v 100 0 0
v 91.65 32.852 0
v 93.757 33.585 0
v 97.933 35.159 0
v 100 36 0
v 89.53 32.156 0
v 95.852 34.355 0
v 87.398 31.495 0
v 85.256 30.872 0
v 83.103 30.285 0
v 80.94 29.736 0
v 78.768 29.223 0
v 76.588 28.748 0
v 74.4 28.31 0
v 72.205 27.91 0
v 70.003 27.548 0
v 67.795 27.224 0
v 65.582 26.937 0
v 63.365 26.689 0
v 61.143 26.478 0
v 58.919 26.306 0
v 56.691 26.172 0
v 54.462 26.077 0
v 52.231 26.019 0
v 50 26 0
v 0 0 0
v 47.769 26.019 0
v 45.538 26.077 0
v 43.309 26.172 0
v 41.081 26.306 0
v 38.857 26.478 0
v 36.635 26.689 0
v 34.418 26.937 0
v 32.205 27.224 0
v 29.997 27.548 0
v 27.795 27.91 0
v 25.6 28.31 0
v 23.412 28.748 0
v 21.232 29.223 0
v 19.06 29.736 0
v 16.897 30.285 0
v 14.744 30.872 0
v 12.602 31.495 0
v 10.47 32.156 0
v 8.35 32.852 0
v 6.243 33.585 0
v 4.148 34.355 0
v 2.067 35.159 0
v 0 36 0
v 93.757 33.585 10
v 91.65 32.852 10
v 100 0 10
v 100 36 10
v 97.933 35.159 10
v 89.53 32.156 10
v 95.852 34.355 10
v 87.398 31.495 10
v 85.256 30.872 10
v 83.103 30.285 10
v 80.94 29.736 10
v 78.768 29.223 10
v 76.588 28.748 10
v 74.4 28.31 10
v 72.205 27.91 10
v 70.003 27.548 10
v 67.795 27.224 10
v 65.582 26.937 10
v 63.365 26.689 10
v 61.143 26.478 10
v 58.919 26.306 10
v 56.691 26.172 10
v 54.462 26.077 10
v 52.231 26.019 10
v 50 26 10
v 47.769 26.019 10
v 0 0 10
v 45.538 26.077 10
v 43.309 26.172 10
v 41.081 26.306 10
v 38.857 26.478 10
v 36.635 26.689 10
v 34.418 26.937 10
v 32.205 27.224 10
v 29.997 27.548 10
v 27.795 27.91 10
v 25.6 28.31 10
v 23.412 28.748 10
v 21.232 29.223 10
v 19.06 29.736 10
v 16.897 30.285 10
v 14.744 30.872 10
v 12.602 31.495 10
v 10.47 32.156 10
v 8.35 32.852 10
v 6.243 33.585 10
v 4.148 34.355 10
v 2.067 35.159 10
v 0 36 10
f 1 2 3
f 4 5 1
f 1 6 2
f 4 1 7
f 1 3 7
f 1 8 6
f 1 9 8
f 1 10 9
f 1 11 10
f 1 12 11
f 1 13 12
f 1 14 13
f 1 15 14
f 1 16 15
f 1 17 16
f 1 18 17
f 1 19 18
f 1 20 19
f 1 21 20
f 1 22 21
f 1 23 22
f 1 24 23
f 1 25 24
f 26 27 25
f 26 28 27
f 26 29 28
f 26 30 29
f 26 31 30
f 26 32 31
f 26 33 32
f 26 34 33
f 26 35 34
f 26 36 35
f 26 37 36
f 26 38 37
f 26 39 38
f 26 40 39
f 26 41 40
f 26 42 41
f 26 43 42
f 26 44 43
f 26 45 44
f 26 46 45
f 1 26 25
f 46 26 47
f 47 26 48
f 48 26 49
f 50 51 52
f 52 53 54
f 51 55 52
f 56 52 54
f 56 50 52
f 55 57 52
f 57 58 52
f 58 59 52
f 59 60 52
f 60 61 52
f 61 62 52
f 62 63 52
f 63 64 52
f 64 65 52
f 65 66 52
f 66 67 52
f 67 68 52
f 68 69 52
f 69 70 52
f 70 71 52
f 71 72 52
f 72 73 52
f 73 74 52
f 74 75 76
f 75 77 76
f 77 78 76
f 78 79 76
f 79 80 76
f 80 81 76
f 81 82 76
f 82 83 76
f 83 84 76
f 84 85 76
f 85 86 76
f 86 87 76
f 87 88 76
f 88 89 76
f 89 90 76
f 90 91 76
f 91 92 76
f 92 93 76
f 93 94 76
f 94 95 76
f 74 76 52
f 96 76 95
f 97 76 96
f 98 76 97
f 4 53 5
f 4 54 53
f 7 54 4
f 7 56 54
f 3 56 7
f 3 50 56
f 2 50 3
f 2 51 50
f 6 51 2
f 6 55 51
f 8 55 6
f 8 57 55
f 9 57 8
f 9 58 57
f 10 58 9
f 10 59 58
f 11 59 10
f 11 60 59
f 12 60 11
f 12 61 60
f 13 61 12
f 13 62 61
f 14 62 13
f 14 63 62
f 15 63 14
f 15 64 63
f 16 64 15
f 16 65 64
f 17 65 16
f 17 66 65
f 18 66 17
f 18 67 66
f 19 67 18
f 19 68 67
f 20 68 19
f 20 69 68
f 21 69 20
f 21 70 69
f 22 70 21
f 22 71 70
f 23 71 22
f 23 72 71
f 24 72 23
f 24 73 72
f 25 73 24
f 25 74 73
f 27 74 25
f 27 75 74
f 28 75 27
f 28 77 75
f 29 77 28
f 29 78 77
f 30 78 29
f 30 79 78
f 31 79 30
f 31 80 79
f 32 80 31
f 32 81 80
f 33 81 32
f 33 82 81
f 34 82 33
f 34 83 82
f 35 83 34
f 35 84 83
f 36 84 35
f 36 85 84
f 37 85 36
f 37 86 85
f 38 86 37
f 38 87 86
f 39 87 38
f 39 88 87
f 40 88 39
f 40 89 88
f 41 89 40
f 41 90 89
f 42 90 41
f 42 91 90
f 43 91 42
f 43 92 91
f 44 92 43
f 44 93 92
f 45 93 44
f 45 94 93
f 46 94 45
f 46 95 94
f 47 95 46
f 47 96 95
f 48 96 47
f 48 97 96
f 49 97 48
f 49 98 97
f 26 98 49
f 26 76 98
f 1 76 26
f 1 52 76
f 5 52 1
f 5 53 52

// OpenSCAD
$fn = 32;

// ----------------------------------------------------------------------
// Arc profile plate: notch, 49 points
// ----------------------------------------------------------------------

// --- parameters (mm) ---
bar_l = 100;              // bar length, X
bar_w = 36;               // bar width, Y
notch_depth = 10;         // depth of the arc notch at mid-span
arc_r = 130;              // radius of the notch arc
arc_angle = 45.24;        // notch arc angle, degrees
arc_step = 1;             // sampling step of the notch arc, degrees
plate_t = 10;             // plate thickness, Z

profile = [[0, 0], [100, 0], [100, 36], [97.933, 35.159], [95.852, 34.355], [93.757, 33.585], [91.65, 32.852], [89.53, 32.156], [87.398, 31.495], [85.256, 30.872], [83.103, 30.285], [80.94, 29.736], [78.768, 29.223], [76.588, 28.748], [74.4, 28.31], [72.205, 27.91], [70.003, 27.548], [67.795, 27.224], [65.582, 26.937], [63.365, 26.689], [61.143, 26.478], [58.919, 26.306], [56.691, 26.172], [54.462, 26.077], [52.231, 26.019], [50, 26], [47.769, 26.019], [45.538, 26.077], [43.309, 26.172], [41.081, 26.306], [38.857, 26.478], [36.635, 26.689], [34.418, 26.937], [32.205, 27.224], [29.997, 27.548], [27.795, 27.91], [25.6, 28.31], [23.412, 28.748], [21.232, 29.223], [19.06, 29.736], [16.897, 30.285], [14.744, 30.872], [12.602, 31.495], [10.47, 32.156], [8.35, 32.852], [6.243, 33.585], [4.148, 34.355], [2.067, 35.159], [0, 36]];  // primary outline, 49 points, counter clockwise

// --- the one profile operation ---
linear_extrude(height = plate_t) polygon(points = profile);
